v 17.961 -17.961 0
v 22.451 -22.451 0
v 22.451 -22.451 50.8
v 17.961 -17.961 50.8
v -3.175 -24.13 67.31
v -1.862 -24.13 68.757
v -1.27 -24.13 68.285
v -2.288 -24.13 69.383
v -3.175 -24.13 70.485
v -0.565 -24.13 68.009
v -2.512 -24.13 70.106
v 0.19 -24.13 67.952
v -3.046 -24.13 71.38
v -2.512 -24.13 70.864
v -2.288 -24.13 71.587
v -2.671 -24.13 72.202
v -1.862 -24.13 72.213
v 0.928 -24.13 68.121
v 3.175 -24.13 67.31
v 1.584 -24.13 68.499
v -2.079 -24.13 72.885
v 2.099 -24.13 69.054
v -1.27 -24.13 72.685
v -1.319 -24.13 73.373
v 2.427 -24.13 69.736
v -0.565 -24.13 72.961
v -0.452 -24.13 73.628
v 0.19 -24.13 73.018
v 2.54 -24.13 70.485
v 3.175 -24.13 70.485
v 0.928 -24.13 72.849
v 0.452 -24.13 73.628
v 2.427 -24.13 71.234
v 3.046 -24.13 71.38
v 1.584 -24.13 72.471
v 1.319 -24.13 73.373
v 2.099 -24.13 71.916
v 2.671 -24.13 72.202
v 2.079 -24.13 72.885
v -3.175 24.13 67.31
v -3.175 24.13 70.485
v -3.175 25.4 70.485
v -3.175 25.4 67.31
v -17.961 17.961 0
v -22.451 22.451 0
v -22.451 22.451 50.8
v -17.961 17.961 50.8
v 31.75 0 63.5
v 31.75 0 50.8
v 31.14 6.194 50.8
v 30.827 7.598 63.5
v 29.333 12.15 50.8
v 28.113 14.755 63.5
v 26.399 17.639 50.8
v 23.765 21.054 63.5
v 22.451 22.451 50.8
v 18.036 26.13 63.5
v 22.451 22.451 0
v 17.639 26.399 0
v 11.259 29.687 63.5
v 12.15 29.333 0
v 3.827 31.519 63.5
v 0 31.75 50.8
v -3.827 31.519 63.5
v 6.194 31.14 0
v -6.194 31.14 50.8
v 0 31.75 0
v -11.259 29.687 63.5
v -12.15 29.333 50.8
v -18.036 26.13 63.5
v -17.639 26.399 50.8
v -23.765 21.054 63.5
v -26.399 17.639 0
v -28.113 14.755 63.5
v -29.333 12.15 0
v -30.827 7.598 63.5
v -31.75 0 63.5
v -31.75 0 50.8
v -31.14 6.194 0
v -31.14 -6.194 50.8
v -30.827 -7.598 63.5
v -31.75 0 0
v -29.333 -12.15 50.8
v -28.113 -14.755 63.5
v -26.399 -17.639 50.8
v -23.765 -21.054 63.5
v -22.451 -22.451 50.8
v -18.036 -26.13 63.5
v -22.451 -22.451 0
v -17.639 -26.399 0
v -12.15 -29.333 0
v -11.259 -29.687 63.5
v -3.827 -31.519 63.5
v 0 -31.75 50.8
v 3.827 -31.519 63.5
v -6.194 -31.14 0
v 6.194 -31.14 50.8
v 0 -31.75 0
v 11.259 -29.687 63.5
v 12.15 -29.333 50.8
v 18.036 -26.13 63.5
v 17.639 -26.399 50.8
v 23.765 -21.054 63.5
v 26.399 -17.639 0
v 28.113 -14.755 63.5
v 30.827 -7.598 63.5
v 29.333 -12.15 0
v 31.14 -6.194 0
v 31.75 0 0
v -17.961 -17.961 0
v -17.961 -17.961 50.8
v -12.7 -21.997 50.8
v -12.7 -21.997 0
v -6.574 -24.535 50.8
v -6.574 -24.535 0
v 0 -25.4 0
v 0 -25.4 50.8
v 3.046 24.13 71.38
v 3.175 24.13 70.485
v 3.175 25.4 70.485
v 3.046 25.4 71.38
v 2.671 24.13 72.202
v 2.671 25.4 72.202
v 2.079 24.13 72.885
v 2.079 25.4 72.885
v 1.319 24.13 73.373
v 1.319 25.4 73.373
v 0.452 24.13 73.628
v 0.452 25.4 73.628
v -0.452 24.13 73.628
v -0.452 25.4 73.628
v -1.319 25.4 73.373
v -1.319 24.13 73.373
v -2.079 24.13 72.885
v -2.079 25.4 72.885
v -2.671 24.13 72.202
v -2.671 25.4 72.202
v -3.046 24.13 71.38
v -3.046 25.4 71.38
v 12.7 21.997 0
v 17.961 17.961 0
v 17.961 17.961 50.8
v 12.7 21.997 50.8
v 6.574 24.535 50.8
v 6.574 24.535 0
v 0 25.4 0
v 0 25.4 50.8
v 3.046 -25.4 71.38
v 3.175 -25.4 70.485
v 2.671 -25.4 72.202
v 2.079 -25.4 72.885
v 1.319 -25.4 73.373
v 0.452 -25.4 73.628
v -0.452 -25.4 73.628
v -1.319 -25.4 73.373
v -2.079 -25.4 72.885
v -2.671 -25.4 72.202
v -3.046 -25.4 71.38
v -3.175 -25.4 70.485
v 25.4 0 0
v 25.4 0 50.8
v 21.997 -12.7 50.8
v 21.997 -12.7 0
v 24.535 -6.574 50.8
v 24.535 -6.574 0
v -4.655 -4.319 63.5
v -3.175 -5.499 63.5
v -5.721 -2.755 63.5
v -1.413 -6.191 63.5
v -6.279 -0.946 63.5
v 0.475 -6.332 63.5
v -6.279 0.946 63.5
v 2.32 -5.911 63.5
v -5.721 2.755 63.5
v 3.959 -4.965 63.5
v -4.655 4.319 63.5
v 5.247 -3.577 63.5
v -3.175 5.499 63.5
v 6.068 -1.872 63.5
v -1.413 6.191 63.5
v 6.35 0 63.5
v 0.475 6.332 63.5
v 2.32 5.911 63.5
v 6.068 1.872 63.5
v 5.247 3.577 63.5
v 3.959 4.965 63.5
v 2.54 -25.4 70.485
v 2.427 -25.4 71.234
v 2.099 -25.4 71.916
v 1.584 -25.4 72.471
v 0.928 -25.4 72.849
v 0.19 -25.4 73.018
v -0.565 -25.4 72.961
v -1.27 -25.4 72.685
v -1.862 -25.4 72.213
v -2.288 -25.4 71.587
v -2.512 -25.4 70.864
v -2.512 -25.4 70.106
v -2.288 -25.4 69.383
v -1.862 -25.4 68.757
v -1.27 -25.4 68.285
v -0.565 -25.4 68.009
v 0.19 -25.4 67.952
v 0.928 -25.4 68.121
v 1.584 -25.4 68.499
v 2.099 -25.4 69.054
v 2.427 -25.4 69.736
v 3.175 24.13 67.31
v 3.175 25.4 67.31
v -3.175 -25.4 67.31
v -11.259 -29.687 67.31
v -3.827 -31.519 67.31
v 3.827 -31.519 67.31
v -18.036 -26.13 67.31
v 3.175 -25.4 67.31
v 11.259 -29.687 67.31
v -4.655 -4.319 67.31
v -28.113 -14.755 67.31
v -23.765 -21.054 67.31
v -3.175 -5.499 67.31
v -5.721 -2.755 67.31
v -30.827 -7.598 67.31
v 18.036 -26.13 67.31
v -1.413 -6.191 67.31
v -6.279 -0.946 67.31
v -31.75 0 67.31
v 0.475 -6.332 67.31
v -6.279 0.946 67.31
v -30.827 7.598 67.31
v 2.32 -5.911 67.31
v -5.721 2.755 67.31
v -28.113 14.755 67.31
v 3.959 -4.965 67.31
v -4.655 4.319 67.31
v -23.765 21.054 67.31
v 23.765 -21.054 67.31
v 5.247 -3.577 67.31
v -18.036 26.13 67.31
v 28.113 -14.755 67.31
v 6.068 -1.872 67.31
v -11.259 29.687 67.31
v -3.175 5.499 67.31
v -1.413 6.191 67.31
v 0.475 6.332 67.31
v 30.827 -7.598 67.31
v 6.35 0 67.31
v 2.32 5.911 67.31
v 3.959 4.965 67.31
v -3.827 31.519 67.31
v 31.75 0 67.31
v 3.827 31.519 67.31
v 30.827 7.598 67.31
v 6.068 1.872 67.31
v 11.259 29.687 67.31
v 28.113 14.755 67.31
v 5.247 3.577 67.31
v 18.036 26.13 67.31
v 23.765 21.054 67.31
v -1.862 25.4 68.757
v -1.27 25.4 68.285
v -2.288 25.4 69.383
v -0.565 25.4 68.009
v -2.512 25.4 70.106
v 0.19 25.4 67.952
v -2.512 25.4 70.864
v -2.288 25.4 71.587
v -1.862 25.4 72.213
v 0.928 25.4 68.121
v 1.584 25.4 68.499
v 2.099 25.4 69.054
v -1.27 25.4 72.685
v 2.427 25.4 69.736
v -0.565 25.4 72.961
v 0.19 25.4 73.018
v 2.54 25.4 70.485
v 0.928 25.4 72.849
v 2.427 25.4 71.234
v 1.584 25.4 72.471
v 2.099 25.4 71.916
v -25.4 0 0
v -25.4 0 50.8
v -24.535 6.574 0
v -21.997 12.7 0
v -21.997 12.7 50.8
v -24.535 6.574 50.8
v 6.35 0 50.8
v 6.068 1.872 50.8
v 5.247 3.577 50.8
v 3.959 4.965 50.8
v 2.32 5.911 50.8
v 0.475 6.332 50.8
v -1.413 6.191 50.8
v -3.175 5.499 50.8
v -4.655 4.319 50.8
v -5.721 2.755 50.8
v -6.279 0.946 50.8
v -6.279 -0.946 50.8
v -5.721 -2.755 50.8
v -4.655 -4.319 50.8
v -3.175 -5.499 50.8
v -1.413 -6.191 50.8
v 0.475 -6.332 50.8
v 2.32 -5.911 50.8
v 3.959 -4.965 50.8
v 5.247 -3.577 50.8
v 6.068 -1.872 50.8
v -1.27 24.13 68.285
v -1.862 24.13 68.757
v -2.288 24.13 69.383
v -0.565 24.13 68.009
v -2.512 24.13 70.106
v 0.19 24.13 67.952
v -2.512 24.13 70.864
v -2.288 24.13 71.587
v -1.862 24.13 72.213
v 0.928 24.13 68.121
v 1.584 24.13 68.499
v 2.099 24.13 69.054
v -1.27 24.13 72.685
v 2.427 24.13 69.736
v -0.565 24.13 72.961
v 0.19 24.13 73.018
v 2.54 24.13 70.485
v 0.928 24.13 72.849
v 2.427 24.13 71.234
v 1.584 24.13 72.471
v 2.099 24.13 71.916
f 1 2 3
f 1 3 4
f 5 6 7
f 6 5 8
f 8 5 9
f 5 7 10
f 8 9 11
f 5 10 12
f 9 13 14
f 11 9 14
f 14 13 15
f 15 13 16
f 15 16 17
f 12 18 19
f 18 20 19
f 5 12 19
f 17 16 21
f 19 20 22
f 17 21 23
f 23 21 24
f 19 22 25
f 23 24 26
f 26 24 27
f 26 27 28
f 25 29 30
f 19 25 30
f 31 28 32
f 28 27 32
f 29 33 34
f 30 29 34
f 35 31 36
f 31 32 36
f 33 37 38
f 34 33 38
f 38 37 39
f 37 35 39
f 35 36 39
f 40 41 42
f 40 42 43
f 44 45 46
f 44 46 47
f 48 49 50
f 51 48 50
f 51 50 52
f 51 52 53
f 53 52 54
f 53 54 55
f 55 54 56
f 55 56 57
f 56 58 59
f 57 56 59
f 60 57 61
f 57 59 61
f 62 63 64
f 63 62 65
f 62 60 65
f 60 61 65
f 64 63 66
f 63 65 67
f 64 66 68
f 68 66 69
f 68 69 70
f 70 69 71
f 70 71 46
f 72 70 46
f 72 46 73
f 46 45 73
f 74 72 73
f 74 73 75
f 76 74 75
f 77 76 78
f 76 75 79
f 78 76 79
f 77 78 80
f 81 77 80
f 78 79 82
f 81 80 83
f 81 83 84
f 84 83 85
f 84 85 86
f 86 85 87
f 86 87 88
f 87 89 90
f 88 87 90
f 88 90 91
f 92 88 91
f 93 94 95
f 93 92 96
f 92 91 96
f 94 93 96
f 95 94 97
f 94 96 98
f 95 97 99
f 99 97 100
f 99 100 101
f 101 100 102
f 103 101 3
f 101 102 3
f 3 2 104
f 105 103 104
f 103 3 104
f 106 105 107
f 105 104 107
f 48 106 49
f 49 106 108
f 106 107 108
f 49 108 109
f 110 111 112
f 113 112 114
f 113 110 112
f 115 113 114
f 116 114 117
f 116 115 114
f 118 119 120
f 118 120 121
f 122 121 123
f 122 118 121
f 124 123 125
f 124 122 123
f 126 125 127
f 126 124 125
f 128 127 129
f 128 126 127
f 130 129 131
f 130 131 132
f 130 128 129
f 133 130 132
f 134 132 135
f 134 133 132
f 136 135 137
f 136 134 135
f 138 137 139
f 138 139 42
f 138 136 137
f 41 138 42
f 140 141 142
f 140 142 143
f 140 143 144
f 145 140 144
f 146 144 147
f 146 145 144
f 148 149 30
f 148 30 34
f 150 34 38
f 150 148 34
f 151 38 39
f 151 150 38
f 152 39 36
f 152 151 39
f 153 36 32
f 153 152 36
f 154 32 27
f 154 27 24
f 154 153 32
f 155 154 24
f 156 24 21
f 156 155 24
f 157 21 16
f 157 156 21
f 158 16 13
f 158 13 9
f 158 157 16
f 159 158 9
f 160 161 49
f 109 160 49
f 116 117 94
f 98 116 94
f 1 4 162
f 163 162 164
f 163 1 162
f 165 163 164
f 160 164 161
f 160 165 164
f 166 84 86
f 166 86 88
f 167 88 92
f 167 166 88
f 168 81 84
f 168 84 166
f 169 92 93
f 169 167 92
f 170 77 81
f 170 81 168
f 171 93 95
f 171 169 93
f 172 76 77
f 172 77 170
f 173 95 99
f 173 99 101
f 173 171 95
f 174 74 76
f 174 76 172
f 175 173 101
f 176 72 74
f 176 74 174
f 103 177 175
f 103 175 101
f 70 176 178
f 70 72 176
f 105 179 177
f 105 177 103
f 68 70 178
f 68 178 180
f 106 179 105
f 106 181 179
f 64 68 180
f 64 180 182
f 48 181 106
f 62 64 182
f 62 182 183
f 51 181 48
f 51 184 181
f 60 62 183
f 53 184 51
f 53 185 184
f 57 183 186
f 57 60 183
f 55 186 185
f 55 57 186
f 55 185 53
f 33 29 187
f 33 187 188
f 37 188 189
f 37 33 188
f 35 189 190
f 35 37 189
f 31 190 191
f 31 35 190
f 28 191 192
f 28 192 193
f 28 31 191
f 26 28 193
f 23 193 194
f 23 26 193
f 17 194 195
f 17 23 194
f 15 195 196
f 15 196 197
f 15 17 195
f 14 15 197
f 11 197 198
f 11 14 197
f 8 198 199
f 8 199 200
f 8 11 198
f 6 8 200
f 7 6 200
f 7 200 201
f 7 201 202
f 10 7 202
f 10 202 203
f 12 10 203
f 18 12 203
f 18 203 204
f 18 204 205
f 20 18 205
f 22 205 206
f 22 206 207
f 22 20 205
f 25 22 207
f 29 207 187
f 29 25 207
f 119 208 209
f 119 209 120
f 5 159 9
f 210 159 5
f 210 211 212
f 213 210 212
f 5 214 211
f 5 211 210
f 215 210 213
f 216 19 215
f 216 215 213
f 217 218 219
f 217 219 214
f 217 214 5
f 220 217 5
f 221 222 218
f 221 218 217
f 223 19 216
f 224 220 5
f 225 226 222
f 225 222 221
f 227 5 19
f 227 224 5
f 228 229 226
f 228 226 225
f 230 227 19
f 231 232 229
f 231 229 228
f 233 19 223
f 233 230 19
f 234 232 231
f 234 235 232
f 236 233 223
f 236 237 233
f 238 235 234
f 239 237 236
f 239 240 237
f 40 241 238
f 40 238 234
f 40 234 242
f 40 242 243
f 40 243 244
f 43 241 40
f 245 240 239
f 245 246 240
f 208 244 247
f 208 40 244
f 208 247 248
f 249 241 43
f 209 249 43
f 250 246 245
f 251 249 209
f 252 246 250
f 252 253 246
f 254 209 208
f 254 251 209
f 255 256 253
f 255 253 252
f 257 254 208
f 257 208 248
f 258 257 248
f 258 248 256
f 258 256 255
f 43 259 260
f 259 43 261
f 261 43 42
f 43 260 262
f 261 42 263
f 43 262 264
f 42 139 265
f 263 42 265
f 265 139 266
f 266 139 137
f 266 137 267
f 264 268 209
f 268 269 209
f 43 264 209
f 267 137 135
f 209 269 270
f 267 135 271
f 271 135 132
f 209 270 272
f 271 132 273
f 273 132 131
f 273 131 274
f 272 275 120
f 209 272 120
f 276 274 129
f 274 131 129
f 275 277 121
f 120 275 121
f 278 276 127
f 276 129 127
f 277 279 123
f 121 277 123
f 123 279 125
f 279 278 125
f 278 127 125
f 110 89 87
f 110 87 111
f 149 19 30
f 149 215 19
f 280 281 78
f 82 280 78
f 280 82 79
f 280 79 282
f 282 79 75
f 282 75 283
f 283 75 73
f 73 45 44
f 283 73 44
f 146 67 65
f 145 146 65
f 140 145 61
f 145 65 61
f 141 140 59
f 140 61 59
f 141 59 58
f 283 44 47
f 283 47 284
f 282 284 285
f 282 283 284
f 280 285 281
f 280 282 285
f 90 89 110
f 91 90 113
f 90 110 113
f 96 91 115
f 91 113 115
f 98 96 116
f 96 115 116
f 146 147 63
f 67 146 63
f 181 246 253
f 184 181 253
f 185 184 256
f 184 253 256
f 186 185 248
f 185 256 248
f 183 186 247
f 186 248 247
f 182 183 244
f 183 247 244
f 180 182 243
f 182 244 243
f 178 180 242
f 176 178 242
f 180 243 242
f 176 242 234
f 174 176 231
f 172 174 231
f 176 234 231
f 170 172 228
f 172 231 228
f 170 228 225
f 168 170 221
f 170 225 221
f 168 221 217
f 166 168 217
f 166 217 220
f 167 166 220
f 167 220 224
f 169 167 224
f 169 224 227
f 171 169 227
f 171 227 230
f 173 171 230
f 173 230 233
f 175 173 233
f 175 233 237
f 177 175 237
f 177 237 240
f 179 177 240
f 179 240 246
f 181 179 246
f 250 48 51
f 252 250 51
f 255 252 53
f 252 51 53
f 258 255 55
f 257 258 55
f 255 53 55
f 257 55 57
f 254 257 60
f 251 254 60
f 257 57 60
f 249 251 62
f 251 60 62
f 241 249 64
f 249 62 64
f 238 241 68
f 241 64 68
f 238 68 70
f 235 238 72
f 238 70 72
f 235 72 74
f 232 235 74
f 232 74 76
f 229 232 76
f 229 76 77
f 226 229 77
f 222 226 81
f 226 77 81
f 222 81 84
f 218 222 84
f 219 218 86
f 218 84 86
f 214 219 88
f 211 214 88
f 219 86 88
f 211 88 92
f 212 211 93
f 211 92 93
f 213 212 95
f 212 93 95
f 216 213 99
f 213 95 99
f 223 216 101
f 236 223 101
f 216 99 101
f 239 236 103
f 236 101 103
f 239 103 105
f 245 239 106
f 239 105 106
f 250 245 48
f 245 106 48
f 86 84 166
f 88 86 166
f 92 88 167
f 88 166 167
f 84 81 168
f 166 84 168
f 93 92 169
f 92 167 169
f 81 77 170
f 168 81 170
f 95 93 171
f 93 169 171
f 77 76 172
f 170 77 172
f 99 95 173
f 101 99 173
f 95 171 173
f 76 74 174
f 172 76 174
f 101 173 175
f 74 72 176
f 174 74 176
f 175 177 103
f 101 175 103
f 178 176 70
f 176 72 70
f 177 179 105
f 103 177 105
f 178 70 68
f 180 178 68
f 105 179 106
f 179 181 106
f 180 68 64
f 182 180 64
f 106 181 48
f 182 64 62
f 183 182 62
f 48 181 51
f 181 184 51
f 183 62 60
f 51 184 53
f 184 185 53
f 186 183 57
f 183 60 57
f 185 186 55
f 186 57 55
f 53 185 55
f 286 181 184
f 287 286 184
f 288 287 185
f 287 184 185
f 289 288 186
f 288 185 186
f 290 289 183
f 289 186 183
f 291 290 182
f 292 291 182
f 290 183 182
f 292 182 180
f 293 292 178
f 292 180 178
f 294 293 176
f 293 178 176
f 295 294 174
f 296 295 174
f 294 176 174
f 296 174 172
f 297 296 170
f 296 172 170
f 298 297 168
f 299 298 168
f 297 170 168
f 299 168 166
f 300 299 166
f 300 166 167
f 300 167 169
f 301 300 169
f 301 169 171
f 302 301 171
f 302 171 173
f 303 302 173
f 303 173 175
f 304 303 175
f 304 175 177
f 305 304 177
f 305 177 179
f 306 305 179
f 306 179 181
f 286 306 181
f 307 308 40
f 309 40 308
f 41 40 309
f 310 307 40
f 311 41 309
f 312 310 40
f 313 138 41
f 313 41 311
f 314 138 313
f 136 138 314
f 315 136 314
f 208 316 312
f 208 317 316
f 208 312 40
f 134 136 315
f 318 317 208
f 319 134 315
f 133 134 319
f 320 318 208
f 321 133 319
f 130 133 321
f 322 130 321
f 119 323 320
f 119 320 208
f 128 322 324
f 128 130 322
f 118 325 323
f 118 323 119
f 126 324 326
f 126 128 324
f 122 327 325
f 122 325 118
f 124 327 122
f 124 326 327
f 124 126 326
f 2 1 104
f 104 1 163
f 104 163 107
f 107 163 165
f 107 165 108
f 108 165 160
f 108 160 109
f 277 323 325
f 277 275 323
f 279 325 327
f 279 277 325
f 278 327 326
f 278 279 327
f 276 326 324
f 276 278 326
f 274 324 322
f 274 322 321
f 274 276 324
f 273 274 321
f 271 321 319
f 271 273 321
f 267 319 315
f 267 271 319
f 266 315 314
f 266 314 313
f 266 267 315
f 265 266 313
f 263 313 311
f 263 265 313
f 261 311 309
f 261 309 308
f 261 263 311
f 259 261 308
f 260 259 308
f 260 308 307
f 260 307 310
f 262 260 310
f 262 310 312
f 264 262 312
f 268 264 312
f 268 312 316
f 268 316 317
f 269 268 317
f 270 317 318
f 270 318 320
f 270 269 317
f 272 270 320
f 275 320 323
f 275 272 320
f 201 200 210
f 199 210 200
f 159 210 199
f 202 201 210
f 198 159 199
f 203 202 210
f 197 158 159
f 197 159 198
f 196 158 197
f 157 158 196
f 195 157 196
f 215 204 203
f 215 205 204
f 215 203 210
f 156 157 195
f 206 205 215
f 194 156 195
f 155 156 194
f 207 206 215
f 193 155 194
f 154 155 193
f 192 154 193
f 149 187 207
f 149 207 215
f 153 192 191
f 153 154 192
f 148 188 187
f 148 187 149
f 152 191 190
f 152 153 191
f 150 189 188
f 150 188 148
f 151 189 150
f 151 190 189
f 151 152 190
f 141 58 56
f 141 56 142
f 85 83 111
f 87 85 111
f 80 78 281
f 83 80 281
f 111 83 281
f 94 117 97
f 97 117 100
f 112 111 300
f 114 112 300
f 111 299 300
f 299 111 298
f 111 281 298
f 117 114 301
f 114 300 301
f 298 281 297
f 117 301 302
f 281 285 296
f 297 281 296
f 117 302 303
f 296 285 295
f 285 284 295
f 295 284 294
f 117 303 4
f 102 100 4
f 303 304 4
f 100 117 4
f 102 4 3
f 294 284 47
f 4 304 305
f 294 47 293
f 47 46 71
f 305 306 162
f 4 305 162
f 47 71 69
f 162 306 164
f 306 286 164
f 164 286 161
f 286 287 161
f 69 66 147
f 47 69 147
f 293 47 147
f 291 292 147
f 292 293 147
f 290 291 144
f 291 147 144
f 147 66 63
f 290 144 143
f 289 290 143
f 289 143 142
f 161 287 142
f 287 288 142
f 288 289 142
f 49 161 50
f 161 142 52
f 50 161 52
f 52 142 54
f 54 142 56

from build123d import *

# Parameters (mm, degrees)
F0_R      = 31.75
F1_DEPTH  = 63.5
F2_R      = 25.4
F3_DEPTH  = 50.8
F5_DEPTH  = 50.8
F6_R      = 31.75
F7_DEPTH  = 3.81
F8_R      = 6.35
F9_DEPTH  = 67.311
F10_R     = 6.35
F11_DEPTH = 63.501
F12_R     = 2.54
F13_DEPTH = 25.4
F14_DEPTH = 24.13


with BuildPart() as f1:
    # F0 (on Top) → F1 (new body)
    with BuildSketch(Plane.XY):
        Circle(F0_R)
    extrude(amount=F1_DEPTH)

    # F2 (on Top) → F3 (cut)
    with BuildSketch(Plane.XY):
        Circle(F2_R)
    extrude(amount=F3_DEPTH, mode=Mode.SUBTRACT)

    # F4 (on Top) → F5 (cut)
    with BuildSketch(Plane.XY):
        with BuildLine():
            Line((-22.4506403027, -22.4506403027), (-17.9605122421, -17.9605122421))
            ThreePointArc((-17.9605122421, -17.9605122421), (-23.4665401258, -9.7201591821), (-25.4, 0))
            Line((-25.4, 0), (-31.75, 0))
            ThreePointArc((-31.75, 0), (-29.3331751572, -12.1501989776), (-22.4506403027, -22.4506403027))
        make_face()
        with BuildLine():
            Line((22.4506403027, -22.4506403027), (17.9605122421, -17.9605122421))
            ThreePointArc((17.9605122421, -17.9605122421), (9.7201591821, -23.4665401258), (0, -25.4))
            Line((0, -25.4), (0, -31.75))
            ThreePointArc((0, -31.75), (12.1501989776, -29.3331751572), (22.4506403027, -22.4506403027))
        make_face()
        with BuildLine():
            ThreePointArc((17.9605122421, 17.9605122421), (23.4665401258, 9.7201591821), (25.4, 0))
            Line((25.4, 0), (31.75, 0))
            ThreePointArc((31.75, 0), (29.3331751572, 12.1501989776), (22.4506403027, 22.4506403027))
            Line((22.4506403027, 22.4506403027), (17.9605122421, 17.9605122421))
        make_face()
        with BuildLine():
            ThreePointArc((-17.9605122421, 17.9605122421), (-9.7201591821, 23.4665401258), (0, 25.4))
            Line((0, 25.4), (0, 31.75))
            ThreePointArc((0, 31.75), (-12.1501989776, 29.3331751572), (-22.4506403027, 22.4506403027))
            Line((-22.4506403027, 22.4506403027), (-17.9605122421, 17.9605122421))
        make_face()
    extrude(amount=F5_DEPTH, mode=Mode.SUBTRACT)


with BuildPart() as f7:
    # F6 (on face) → F7 (new body)
    with BuildSketch(Plane.XY.offset(63.5)):
        Circle(F6_R)
    extrude(amount=F7_DEPTH)


with BuildPart() as f9_tool:
    # F8 (on face) → F9 (new body, through all)
    with BuildSketch(Plane.XY.offset(67.31)):
        Circle(F8_R)
    extrude(amount=-F9_DEPTH)


with BuildPart() as f1_1:
    add(f1.part)

    # F9: cut by f9_tool
    add(f9_tool.part, mode=Mode.SUBTRACT)

    # F10 (on face) → F11 (cut, through all)
    with BuildSketch(Plane.XY.offset(63.5)):
        Circle(F10_R)
    extrude(amount=-F11_DEPTH, mode=Mode.SUBTRACT)


with BuildPart() as f7_1:
    add(f7.part)

    # F9: cut by f9_tool
    add(f9_tool.part, mode=Mode.SUBTRACT)

    # F12 (on Front) → F13 (join, symmetric)
    with BuildSketch(Plane.XZ):
        with BuildLine():
            Line((-3.175, 70.485), (-3.175, 67.31))
            Line((-3.175, 67.31), (3.175, 67.31))
            Line((3.175, 67.31), (3.175, 70.485))
            ThreePointArc((3.175, 70.485), (0, 73.66), (-3.175, 70.485))
        make_face()
        with Locations((0, 70.485)):
            Circle(F12_R, mode=Mode.SUBTRACT)
    extrude(amount=F13_DEPTH, both=True)

    # F12 (on Front) → F14 (cut, symmetric)
    with BuildSketch(Plane.XZ):
        with BuildLine():
            Line((-3.175, 70.485), (-3.175, 67.31))
            Line((-3.175, 67.31), (3.175, 67.31))
            Line((3.175, 67.31), (3.175, 70.485))
            ThreePointArc((3.175, 70.485), (0, 73.66), (-3.175, 70.485))
        make_face()
        with Locations((0, 70.485)):
            Circle(F12_R, mode=Mode.SUBTRACT)
    extrude(amount=F14_DEPTH, both=True, mode=Mode.SUBTRACT)


solid = Compound([f1_1.part, f7_1.part])
